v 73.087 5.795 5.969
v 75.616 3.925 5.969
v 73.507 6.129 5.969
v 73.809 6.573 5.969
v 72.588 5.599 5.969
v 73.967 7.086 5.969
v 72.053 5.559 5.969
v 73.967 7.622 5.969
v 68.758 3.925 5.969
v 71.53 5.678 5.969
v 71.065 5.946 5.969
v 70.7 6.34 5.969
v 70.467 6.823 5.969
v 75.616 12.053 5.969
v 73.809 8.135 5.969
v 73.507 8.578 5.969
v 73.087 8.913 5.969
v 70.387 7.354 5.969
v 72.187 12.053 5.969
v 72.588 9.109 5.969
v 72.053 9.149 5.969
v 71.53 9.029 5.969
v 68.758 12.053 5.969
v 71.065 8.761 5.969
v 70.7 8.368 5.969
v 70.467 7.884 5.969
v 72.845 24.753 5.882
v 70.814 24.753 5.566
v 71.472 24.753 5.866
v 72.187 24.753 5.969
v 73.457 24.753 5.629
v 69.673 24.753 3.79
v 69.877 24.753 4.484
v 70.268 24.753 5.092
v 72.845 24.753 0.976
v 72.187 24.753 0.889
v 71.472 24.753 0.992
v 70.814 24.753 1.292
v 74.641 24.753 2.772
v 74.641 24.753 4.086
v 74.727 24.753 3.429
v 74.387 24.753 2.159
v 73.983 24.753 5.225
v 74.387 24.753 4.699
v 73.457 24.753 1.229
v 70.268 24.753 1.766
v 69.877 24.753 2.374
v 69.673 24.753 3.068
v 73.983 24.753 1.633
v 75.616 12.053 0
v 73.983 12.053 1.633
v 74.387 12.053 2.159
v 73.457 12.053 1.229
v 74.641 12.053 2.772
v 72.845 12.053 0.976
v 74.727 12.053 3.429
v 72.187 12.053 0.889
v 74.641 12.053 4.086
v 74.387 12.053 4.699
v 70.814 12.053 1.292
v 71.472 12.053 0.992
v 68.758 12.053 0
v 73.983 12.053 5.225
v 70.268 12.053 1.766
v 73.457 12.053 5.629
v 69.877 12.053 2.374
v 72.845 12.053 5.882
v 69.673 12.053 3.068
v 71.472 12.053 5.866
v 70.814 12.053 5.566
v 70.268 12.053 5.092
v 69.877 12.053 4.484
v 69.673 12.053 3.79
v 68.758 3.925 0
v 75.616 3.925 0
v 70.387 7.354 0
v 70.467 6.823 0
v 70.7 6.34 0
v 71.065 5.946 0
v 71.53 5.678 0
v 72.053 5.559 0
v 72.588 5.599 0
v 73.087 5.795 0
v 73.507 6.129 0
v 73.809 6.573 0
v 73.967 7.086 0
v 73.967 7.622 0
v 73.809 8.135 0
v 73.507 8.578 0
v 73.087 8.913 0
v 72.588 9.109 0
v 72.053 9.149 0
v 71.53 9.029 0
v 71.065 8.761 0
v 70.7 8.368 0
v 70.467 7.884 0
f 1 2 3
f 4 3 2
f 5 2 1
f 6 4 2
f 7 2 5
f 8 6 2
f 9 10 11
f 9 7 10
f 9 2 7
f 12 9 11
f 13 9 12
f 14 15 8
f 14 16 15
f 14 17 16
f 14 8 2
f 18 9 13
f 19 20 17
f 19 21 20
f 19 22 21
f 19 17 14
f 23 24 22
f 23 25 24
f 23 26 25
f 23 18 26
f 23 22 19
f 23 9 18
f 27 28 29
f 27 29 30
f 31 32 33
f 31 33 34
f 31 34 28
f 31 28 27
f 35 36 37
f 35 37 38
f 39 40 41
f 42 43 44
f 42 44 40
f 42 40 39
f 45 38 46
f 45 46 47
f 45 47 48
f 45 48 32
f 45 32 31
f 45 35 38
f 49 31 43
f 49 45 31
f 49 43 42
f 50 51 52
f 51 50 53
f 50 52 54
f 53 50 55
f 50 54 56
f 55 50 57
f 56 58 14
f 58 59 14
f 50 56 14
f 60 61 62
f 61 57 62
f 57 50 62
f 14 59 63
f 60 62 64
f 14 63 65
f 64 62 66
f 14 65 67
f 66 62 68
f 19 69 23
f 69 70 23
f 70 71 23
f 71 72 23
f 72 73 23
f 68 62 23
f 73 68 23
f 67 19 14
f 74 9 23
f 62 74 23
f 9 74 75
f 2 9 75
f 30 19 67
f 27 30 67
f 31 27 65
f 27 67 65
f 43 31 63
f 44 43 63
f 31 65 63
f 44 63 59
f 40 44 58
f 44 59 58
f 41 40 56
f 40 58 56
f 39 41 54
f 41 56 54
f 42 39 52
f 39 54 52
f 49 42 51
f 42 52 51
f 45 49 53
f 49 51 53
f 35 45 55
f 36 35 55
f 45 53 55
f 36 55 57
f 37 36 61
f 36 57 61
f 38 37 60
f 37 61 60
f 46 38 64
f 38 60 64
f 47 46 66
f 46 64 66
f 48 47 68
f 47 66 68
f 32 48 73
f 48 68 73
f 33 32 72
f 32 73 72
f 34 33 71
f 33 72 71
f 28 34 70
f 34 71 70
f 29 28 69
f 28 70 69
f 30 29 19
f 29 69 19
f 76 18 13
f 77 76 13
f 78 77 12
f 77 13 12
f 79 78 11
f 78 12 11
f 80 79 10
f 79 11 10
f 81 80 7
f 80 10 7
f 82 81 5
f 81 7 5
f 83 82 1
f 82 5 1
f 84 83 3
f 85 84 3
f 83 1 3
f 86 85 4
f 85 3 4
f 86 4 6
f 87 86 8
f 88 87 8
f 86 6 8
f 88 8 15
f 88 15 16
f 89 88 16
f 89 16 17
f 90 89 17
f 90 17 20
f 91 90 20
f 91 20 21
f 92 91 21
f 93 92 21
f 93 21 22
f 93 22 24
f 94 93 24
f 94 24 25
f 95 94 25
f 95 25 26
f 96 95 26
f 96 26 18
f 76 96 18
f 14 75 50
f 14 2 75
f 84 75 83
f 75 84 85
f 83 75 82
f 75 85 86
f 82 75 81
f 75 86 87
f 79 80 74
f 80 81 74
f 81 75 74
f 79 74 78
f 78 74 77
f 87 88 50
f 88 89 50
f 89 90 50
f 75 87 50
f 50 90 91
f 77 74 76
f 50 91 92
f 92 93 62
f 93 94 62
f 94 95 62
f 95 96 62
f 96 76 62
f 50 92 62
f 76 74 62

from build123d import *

# Parameters (mm, degrees)
SKETCH1_W            = 6.858
SKETCH1_H            = 6.858
BOSS_EXTRUDE1_DEPTH  = 6.858
CUT_EXTRUDE1_DEPTH   = 6.858
BOSS_EXTRUDE2_DEPTH  = 12.7
MOVE_FACE1_BY        = 0.889
MOVE_START           = 68.758370303
MOVE_FACE2_OUTLINE_W = 1.27
MOVE_FACE2_OUTLINE_H = 5.969
MOVE_FACE2_DEPTH     = 6.858
MOVE_FACE3_BY        = 1.27


# Read off the part's stored shape, not the designer's step: Move Face2
with BuildPart() as part:
    # Sketch1 → Boss-Extrude1 (new body)
    with BuildSketch(Plane.XY):
        with Locations((72.187370303, 7.35377716)):
            Rectangle(SKETCH1_W, SKETCH1_H)
    extrude(amount=BOSS_EXTRUDE1_DEPTH)

    # Sketch3 → Cut-Extrude1 (cut)
    with BuildSketch(Plane.XY.offset(6.858)):
        with BuildLine():
            ThreePointArc((73.987370303, 7.35377716), (72.187370303, 9.15377716), (70.387370303, 7.35377716))
            Line((70.387370303, 7.35377716), (73.987370303, 7.35377716))
        make_face()
        with BuildLine():
            Line((73.987370303, 7.35377716), (70.387370303, 7.35377716))
            ThreePointArc((70.387370303, 7.35377716), (72.187370303, 5.55377716), (73.987370303, 7.35377716))
        make_face()
    extrude(amount=-CUT_EXTRUDE1_DEPTH, mode=Mode.SUBTRACT)

    # Sketch5 → Boss-Extrude2 (add)
    with BuildSketch(Plane(origin=(0, 10.78277716, 0), x_dir=(1, 0, 0), z_dir=(0, 1, 0))):
        with BuildLine():
            ThreePointArc((72.187370303, -0.889), (69.647370303, -3.429), (72.187370303, -5.969))
            Line((72.187370303, -5.969), (72.187370303, -0.889))
        make_face()
        with BuildLine():
            Line((72.187370303, -0.889), (72.187370303, -5.969))
            ThreePointArc((72.187370303, -5.969), (73.983421527, -5.225051224), (74.727370303, -3.429))
            ThreePointArc((74.727370303, -3.429), (73.983421527, -1.632948776), (72.187370303, -0.889))
        make_face()
    extrude(amount=BOSS_EXTRUDE2_DEPTH)

    # Move Face1: a face moved inward by 0.889
    extrude(part.faces().sort_by_distance((72.187370303, 4.61057716, 6.858))[0], amount=MOVE_FACE1_BY, dir=(0, 0, -1), mode=Mode.SUBTRACT)

    # Move Face2 outline → Move Face2 (add)
    with BuildSketch(Plane.YZ.offset(MOVE_START)):
        with Locations((11.41777716, 2.9845)):
            Rectangle(MOVE_FACE2_OUTLINE_W, MOVE_FACE2_OUTLINE_H)
    extrude(amount=MOVE_FACE2_DEPTH)

    # Move Face3: a face moved outward by 1.27
    extrude(part.faces().sort_by_distance((72.187370303, 23.48277716, 3.429))[0], amount=MOVE_FACE3_BY, dir=(0, 1, 0))


solid = part.part
